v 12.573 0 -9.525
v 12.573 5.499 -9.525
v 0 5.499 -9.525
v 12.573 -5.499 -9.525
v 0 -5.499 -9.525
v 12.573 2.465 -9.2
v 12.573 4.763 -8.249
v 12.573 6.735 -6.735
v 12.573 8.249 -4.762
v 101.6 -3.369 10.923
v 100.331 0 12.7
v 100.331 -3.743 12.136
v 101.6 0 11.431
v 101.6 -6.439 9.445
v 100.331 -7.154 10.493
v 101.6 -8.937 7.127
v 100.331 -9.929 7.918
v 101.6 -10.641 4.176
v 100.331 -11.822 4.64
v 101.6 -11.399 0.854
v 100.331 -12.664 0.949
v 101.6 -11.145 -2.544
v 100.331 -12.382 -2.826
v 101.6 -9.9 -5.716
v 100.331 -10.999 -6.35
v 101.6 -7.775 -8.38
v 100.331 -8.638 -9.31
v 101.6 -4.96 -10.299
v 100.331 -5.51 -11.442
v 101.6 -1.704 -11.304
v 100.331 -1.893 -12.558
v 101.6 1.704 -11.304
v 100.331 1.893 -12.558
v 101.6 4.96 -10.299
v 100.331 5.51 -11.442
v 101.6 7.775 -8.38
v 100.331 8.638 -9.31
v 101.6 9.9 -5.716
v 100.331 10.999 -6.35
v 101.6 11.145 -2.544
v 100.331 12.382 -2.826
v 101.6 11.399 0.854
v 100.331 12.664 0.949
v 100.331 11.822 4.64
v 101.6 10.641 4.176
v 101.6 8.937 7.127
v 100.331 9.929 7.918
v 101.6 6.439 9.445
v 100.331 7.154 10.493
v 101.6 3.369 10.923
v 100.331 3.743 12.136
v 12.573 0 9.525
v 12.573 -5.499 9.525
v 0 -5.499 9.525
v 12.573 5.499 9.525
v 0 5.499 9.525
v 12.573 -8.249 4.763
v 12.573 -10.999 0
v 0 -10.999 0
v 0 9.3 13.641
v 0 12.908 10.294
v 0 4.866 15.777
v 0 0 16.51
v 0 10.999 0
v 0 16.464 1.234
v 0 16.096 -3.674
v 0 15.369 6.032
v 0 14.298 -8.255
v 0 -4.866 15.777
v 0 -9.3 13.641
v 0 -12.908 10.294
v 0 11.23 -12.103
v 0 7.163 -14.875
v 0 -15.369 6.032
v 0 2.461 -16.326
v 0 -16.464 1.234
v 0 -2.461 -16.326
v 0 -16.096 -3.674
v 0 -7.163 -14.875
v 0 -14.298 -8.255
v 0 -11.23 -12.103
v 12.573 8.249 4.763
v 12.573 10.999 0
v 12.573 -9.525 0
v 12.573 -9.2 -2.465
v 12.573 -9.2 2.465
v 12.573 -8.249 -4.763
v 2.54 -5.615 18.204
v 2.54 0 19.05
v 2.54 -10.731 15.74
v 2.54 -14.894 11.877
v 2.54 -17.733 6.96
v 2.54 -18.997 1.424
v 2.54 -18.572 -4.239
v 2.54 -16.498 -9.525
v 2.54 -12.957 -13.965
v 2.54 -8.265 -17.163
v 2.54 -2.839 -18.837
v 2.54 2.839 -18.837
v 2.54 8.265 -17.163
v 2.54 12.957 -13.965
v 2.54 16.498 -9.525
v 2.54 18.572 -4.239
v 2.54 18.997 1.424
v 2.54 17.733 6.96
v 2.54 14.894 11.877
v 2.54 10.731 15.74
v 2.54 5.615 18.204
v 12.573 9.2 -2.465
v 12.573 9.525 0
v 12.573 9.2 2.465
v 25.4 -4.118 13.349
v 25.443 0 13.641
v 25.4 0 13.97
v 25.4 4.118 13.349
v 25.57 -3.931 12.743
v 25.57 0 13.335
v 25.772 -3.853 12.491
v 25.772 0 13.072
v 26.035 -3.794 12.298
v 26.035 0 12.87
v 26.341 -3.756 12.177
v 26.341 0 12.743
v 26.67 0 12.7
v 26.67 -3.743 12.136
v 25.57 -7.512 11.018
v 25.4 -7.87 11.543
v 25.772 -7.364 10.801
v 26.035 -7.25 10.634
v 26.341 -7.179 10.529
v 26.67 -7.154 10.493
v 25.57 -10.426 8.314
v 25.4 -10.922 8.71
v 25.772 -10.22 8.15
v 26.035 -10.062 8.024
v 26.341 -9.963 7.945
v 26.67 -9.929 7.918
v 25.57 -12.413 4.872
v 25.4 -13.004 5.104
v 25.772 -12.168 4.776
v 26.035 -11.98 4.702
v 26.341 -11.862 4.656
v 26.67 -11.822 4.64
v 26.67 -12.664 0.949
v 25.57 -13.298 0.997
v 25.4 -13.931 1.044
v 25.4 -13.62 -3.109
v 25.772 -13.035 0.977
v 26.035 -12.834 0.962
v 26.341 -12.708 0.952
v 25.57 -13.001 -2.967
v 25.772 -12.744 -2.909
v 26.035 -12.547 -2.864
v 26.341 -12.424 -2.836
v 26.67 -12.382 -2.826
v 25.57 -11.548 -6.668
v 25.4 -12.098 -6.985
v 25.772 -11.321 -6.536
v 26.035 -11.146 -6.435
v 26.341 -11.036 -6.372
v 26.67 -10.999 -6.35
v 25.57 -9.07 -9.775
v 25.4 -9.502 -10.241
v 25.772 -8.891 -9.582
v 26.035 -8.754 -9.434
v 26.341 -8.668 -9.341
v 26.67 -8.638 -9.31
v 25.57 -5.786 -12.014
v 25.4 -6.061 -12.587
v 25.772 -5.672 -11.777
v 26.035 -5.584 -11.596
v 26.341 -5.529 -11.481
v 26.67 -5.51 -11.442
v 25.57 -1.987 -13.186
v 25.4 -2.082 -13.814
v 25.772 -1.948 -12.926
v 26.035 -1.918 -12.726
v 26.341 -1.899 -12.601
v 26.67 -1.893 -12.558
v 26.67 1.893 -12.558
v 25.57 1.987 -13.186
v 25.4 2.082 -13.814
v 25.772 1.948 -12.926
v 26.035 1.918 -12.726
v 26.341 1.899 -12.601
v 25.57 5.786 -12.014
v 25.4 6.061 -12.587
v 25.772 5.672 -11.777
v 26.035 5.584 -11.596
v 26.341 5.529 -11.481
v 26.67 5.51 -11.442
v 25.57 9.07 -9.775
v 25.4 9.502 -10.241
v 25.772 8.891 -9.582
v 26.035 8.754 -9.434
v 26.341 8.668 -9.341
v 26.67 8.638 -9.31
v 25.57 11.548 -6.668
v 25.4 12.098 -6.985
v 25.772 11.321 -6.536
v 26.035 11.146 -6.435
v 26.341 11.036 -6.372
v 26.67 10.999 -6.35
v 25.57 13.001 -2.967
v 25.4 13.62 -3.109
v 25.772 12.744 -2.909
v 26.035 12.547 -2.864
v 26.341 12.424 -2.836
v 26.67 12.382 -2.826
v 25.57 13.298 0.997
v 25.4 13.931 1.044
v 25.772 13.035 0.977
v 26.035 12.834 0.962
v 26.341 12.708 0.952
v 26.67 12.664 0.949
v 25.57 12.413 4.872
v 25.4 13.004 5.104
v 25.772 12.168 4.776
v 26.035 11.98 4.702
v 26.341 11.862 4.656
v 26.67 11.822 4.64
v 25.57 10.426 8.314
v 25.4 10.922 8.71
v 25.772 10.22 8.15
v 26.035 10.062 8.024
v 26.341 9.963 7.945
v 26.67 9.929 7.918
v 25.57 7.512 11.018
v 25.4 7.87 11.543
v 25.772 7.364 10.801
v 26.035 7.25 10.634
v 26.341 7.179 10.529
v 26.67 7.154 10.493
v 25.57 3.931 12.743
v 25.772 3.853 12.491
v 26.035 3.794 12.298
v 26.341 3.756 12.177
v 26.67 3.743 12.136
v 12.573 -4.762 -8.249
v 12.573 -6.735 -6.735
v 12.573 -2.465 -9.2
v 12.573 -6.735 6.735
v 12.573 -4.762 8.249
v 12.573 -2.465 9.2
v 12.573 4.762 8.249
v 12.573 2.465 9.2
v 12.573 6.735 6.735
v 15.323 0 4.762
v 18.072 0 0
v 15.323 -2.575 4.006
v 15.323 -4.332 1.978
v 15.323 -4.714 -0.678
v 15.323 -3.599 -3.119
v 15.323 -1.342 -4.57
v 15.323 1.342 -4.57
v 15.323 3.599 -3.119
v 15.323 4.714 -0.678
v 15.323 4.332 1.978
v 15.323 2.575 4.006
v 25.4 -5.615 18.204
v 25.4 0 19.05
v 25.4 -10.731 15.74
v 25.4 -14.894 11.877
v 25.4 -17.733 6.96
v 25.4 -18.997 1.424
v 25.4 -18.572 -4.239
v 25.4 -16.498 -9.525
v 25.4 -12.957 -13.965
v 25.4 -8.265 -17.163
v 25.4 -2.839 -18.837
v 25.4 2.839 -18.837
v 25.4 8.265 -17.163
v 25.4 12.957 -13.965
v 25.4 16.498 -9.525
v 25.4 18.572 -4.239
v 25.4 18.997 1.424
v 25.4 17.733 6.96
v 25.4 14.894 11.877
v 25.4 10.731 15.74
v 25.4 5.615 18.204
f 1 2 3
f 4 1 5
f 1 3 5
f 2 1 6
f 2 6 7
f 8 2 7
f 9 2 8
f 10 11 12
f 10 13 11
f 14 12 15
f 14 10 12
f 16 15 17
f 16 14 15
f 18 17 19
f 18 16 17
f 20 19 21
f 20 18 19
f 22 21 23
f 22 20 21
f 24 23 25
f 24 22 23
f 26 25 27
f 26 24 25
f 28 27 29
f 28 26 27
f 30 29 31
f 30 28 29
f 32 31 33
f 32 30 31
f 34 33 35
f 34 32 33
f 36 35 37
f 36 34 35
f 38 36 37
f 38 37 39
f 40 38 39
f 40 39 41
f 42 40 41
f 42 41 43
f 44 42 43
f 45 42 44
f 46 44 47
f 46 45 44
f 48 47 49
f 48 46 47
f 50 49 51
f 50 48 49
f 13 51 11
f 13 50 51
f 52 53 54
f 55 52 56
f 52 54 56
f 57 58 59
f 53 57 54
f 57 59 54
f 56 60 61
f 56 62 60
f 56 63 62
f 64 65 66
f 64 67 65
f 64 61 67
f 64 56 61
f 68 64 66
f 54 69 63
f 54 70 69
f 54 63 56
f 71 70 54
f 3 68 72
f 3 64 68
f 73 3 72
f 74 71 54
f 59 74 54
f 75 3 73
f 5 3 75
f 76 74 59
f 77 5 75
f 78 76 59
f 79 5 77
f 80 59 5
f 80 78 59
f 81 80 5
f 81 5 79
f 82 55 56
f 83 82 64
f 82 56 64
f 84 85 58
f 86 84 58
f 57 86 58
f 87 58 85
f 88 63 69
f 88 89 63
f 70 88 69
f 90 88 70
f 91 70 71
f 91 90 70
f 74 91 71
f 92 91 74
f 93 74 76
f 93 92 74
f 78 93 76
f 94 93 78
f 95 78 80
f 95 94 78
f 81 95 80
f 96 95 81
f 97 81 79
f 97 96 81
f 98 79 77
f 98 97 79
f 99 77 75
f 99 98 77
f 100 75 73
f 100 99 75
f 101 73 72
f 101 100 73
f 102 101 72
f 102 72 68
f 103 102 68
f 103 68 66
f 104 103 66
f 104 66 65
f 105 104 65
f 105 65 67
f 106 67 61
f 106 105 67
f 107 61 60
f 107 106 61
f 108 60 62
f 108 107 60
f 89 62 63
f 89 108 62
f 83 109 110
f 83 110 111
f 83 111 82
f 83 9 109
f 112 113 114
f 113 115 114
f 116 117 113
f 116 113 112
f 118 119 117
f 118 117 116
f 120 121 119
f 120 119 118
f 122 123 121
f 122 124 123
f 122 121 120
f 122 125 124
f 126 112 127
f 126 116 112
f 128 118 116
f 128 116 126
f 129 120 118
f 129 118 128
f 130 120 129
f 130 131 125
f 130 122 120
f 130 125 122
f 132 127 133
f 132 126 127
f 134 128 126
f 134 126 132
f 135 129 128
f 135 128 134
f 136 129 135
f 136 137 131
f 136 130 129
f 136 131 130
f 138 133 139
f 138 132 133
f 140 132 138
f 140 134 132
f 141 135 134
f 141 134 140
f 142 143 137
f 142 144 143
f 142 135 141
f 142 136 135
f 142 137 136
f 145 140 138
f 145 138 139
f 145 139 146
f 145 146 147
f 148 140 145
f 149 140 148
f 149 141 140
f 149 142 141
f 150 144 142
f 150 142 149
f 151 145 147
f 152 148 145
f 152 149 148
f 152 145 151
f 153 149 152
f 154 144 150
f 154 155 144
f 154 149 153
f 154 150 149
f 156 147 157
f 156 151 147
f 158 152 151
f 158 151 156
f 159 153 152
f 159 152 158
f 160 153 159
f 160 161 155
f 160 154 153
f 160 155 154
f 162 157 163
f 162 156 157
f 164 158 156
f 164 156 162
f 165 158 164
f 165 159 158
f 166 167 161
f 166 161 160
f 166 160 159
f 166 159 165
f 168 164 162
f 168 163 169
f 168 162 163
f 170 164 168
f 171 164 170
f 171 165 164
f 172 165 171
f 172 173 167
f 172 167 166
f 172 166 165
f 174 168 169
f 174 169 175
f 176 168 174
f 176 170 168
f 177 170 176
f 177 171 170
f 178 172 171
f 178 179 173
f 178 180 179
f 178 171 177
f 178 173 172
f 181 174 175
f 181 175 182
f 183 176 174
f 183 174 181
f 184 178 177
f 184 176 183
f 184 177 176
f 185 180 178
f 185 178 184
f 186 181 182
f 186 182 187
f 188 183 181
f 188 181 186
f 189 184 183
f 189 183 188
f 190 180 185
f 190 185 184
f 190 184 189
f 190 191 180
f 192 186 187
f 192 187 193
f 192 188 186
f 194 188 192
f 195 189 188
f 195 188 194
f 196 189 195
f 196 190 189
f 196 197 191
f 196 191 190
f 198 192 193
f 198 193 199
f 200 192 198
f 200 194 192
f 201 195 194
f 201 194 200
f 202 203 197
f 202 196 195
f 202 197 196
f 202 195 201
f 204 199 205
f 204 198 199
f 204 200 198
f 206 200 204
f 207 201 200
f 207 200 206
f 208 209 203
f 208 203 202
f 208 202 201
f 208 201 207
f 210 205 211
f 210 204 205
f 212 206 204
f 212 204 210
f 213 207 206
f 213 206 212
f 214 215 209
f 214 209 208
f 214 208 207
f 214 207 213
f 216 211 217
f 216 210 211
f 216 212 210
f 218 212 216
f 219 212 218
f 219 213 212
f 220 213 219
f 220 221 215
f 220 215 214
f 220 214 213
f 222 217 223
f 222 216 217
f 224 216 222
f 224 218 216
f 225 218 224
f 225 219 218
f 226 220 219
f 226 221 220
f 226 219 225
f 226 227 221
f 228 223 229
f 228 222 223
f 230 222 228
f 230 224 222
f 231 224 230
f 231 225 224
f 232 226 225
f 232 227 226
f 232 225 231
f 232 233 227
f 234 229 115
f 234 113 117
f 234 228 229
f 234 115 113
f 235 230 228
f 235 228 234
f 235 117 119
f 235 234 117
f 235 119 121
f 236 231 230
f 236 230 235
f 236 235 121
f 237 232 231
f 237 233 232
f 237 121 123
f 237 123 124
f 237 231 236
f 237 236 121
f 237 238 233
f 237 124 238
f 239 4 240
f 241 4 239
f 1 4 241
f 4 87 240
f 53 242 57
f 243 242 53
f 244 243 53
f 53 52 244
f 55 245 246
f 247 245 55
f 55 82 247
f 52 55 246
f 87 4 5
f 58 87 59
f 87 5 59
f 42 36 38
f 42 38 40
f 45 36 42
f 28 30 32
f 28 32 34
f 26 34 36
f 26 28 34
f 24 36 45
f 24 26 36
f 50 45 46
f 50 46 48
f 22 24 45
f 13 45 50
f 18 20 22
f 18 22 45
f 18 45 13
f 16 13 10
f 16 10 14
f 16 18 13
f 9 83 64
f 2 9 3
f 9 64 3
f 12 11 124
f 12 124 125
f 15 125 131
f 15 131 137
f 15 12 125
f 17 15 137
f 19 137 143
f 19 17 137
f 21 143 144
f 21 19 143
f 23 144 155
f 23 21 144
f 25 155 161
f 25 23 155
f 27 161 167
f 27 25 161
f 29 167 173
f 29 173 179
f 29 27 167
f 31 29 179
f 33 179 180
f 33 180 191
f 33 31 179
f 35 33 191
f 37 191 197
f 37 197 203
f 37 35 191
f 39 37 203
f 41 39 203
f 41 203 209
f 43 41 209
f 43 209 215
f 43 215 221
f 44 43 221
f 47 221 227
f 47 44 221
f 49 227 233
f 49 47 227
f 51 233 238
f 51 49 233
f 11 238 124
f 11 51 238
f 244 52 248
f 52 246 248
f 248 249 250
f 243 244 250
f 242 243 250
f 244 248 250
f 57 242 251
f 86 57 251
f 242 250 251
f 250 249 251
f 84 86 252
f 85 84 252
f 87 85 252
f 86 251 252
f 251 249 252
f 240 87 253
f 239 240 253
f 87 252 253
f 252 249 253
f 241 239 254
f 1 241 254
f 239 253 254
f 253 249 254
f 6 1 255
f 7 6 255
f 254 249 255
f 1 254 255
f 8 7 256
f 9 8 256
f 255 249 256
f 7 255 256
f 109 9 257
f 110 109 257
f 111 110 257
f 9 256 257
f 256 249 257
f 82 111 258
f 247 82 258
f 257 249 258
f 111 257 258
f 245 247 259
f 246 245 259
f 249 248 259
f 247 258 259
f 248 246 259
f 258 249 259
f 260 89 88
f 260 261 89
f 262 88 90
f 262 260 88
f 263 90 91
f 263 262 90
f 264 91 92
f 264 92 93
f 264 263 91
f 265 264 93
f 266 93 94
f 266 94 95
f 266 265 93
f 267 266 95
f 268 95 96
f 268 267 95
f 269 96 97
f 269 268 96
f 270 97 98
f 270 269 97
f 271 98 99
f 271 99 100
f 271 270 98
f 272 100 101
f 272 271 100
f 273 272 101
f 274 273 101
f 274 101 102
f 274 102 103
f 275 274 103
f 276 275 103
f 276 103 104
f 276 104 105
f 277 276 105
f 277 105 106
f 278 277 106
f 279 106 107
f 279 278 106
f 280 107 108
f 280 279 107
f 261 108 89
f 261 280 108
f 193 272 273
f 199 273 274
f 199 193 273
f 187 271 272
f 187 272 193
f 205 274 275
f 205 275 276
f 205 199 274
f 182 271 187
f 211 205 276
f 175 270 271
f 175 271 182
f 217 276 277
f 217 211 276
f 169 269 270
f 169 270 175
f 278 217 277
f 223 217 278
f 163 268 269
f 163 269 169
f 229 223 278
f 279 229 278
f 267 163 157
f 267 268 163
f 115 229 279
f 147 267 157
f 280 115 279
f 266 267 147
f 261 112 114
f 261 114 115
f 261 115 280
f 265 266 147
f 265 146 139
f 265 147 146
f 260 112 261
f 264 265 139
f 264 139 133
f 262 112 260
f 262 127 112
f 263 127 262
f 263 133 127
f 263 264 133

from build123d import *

# Parameters (mm, degrees)
FILLET1_R   = 1.27
HEX_2_DEPTH = 12.573


with BuildPart() as part:
    # BodySke → Base-Revolve (revolve)
    with BuildSketch(Plane.XY, mode=Mode.PRIVATE) as base_revolve_sk:
        Polygon((0, 0), (0, 16.51), (2.54, 19.05), (25.4, 19.05), (25.4, 12.7), (100.33127, 12.7), (101.6, 11.43127), (101.6, 0), align=None)
    revolve(base_revolve_sk.sketch.rotate(Axis((-31.75, 0, 0), (1, 0, 0)), 90), axis=Axis((-31.75, 0, 0), (1, 0, 0)))  # turned: the seam where the file's is

    # Fillet1
    fillet1_edges = [part.edges().sort_by_distance(p)[0] for p in [
        (25.4, 0, -12.7),
    ]]
    fillet(fillet1_edges, radius=FILLET1_R)

    # Sketch2 → Hex-PreBroach (revolve, cut)
    with BuildSketch(Plane.XY, mode=Mode.PRIVATE) as hex_prebroach_sk:
        Polygon((0, 9.525), (12.573, 9.525), (18.072261314, 0), (0, 0), align=None)
    revolve(hex_prebroach_sk.sketch.rotate(Axis((0, 0, 0), (1, 0, 0)), 90), axis=Axis((0, 0, 0), (1, 0, 0)), mode=Mode.SUBTRACT)  # turned: the seam where the file's is

    # Sketch3 → Hex 2 (cut)
    with BuildSketch(Plane(origin=(0, 0, 0), x_dir=(0, 0.5, 0.866025404), z_dir=(-1, 0, 0))):
        Polygon((5.499261314, 9.525), (-5.499261314, 9.525), (-10.998522628, 0), (-5.499261314, -9.525), (5.499261314, -9.525), (10.998522628, 0), align=None)
    extrude(amount=-HEX_2_DEPTH, mode=Mode.SUBTRACT)


solid = part.part
